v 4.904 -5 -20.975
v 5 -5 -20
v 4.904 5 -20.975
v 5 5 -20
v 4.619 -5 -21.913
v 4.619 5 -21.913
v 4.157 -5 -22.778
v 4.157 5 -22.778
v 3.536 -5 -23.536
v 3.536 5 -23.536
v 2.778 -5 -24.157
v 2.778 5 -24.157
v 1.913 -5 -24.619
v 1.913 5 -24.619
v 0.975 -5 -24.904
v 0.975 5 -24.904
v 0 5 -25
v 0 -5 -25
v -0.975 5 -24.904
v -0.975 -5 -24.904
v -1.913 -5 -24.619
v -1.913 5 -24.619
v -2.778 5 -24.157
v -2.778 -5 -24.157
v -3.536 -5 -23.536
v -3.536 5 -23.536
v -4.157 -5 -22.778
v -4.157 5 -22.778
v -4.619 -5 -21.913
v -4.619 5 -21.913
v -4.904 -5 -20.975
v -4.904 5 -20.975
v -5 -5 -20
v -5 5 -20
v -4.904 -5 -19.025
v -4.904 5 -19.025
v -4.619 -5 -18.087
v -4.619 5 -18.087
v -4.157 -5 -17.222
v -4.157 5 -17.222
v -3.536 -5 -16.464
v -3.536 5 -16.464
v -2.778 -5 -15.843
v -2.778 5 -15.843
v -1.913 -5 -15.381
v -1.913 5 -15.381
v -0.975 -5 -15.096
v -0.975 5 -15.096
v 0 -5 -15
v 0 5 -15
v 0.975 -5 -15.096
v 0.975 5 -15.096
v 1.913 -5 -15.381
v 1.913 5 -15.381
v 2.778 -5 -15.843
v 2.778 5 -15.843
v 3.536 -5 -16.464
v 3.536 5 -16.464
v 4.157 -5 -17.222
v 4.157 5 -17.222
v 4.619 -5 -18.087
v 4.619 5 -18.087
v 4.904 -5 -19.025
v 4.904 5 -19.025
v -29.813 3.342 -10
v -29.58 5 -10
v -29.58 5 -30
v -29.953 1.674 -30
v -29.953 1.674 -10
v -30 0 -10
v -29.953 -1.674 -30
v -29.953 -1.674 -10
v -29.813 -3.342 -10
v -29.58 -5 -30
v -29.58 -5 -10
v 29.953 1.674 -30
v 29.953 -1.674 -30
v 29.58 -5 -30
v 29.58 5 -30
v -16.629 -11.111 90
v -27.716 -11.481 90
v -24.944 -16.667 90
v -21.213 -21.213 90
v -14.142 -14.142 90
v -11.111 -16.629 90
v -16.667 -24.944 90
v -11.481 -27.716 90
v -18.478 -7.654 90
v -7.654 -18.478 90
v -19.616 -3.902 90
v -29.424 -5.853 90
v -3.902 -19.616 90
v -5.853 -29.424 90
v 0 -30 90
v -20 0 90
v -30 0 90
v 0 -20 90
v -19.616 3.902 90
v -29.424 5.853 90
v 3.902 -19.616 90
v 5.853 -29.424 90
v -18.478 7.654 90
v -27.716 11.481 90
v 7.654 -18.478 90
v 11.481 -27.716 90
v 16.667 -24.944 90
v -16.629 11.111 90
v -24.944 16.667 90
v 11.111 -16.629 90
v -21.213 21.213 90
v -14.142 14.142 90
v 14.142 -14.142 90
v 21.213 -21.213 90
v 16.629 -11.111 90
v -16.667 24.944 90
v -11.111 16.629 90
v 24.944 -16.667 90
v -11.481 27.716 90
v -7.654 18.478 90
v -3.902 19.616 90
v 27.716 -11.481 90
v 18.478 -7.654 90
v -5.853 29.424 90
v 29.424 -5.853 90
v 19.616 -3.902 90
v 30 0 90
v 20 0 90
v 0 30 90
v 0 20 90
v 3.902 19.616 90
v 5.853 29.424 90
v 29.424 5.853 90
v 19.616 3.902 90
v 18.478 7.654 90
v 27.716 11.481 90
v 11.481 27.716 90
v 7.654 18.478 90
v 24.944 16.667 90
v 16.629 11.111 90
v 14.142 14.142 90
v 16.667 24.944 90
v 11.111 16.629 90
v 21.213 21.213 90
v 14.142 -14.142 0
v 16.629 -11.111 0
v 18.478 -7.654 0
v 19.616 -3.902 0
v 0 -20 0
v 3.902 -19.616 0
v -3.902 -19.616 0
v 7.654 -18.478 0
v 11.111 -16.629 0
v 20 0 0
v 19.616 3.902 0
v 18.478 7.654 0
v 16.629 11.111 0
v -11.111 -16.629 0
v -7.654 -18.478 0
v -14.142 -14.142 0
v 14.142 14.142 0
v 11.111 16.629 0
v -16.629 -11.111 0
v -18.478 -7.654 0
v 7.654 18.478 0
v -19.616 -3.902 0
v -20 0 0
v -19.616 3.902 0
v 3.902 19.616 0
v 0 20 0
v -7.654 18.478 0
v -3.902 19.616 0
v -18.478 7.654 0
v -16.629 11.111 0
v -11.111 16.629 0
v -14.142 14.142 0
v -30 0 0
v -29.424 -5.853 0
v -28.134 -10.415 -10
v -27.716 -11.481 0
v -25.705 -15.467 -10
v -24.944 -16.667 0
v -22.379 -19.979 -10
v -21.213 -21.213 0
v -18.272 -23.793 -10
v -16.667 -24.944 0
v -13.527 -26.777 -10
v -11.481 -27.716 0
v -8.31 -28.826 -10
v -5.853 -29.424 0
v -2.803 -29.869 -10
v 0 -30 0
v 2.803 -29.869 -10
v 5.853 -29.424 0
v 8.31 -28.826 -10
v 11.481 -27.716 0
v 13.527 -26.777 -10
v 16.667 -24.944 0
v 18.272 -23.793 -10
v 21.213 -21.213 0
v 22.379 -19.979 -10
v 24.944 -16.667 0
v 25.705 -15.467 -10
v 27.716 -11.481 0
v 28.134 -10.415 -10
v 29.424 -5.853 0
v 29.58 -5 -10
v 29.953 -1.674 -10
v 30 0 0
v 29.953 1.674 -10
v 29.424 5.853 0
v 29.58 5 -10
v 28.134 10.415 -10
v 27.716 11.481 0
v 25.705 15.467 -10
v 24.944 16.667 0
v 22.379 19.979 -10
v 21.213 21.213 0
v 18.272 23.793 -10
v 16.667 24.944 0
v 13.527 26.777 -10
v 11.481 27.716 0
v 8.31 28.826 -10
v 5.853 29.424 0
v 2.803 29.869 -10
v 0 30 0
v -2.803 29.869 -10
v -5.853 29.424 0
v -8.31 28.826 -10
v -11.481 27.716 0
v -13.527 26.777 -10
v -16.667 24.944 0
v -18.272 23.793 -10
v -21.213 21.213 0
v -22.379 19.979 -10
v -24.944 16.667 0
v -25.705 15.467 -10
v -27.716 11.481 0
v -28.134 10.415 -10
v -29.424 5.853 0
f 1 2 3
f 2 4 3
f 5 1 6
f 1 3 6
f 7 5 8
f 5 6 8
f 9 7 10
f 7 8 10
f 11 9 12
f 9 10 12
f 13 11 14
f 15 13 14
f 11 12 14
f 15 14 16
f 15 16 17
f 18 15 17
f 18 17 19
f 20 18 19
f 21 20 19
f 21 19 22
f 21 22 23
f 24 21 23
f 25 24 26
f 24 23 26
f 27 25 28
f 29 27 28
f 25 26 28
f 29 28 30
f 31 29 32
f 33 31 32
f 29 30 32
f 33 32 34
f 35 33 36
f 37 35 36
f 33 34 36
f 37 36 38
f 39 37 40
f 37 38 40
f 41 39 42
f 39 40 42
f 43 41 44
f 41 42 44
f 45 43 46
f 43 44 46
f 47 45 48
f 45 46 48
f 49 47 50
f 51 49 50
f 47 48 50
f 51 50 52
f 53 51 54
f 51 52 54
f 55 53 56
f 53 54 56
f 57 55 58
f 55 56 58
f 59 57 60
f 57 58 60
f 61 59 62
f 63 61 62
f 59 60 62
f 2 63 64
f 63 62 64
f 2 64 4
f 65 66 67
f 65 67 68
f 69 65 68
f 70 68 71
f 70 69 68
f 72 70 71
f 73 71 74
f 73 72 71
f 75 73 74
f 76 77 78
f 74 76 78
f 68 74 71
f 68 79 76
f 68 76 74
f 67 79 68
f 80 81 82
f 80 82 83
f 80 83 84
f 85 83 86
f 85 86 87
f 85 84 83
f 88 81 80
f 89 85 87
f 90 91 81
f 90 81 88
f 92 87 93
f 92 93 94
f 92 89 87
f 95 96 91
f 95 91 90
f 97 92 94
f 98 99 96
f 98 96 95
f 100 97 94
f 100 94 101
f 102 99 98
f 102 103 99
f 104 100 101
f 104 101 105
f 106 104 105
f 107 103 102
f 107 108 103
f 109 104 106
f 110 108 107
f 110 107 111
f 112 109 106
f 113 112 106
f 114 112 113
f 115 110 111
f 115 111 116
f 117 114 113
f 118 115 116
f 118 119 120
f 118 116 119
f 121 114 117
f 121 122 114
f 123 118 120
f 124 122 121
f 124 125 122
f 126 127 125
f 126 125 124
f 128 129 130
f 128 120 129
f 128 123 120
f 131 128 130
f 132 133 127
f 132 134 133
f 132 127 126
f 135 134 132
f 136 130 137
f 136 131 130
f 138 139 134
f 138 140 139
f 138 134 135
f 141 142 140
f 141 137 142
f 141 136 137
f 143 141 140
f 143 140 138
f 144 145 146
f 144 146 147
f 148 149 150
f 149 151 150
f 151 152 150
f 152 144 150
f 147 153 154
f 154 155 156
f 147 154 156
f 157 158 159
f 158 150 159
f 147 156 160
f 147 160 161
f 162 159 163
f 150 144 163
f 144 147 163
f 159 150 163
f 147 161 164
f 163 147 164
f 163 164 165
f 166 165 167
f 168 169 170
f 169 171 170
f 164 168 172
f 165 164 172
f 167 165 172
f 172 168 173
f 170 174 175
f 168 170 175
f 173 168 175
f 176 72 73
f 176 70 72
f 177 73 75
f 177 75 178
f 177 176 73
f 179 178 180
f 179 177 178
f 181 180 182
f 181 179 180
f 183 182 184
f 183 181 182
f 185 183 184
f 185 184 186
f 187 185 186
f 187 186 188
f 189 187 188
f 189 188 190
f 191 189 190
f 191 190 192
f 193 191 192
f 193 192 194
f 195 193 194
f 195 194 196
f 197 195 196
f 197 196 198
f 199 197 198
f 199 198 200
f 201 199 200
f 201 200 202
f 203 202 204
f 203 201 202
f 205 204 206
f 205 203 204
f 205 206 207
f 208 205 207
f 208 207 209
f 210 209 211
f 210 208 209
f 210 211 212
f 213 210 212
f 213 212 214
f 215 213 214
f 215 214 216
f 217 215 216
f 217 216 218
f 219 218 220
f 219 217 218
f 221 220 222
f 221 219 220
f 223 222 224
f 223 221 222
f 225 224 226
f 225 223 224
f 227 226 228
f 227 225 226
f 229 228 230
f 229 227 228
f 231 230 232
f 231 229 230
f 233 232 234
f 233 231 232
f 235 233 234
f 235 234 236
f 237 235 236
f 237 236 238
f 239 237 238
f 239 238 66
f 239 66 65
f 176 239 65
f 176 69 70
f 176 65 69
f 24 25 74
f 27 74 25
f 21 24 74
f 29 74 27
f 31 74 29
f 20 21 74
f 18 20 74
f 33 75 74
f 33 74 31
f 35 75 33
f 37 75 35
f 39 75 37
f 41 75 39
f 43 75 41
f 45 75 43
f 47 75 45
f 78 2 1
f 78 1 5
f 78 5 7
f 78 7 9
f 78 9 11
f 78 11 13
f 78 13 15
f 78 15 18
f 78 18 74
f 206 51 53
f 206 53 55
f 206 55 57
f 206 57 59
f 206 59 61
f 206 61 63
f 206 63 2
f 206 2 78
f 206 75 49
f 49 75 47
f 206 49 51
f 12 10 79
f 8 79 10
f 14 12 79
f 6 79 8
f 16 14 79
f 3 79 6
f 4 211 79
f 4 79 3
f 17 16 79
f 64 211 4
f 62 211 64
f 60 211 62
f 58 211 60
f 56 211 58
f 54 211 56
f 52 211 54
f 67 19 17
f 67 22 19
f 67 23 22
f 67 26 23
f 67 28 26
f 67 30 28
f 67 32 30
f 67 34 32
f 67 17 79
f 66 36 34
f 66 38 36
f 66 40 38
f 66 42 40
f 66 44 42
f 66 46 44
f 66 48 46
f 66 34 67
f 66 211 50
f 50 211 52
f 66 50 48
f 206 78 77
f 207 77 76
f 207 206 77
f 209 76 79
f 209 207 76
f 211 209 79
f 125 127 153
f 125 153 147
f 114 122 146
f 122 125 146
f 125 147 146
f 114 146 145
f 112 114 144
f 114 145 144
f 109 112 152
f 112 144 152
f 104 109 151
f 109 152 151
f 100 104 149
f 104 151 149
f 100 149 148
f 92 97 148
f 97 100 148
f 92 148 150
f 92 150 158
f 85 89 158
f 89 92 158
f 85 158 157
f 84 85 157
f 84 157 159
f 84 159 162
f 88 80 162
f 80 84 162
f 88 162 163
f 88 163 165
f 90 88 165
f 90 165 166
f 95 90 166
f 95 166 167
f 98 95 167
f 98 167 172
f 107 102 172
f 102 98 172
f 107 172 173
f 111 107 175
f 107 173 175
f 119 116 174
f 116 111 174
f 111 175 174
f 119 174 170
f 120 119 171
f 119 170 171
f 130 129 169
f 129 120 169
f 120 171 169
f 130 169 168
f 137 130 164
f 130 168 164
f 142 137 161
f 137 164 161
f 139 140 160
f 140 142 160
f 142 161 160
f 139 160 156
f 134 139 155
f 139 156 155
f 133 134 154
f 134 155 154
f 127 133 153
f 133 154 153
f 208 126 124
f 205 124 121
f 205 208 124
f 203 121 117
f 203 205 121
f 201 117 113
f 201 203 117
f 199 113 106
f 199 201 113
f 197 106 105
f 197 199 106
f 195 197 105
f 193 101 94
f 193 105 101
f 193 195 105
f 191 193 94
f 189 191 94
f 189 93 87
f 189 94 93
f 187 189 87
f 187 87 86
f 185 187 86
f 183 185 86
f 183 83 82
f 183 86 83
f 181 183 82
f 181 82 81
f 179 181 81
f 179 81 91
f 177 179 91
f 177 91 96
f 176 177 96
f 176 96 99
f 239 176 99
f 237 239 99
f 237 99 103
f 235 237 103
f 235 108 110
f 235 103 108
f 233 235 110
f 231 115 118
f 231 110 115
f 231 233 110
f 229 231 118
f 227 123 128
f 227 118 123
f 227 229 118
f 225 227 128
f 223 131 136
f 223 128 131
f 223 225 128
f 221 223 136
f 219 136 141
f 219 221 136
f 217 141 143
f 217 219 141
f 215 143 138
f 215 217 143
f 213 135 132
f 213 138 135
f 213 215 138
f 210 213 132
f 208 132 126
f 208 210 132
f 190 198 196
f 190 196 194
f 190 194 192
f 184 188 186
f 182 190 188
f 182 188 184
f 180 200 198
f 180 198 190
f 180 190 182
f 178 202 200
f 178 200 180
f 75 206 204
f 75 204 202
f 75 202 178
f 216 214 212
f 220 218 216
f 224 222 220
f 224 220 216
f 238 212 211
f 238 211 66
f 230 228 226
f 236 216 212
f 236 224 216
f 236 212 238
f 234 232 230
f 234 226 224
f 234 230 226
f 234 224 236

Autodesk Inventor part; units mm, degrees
ref_plane "YZ Plane" through (0, 0, 0) normal (1, 0, 0) x (0, 1, 0)
ref_plane "XZ Plane" through (0, 0, 0) normal (0, 1, 0) x (-1, 0, 0)
ref_plane "XY Plane" through (0, 0, 0) normal (0, 0, 1) x (1, 0, 0)
sketch "Эскиз1" plane through (0, 0, 0) normal (0, 0, 1) x (1, 0, 0)
  circle A0 centre (0, 0) radius 20
  circle A1 centre (0, 0) radius 30
  dimension "d0" = 40
  dimension "d1" = 10
extrude "Выдавливание1" add sketch "Эскиз1" along normal blind 90
sketch "Эскиз2" plane through (0, 0, 0) normal (0, 0, -1) x (-1, 0, 0)
  circle A0 centre (0, 0) radius 30 projected
extrude "Выдавливание2" add sketch "Эскиз2" along normal blind 10
sketch "Эскиз3" plane through (0, 0, -10) normal (0, 0, -1) x (-1, 0, 0)
  circle A0 centre (0, 0) radius 30 projected
  line L0 (-29.5804, 5) -> (29.5804, 5)
  line L1 (29.5804, -5) -> (-29.5804, -5)
  line L2 (42, 0) -> (-42, 0) projected
  dimension "d7" = 10
extrude "Выдавливание3" add sketch "Эскиз3" along normal blind 20 contours L2 A0 L0 | A0 L1 L2
sketch "Эскиз4" plane through (-29.5804, 5, -10) normal (0, 1, 0) x (1, 0, 0)
  line L0 (59.1608, 0) -> (0, 0) projected
  line L1 (59.1608, 0) -> (59.1608, 20) projected
  line L2 (0, 20) -> (59.1608, 20) projected
  line L3 (0, 0) -> (0, 20) projected
  line L4 (59.1608, 0) -> (59.1608, 20) projected
  line L5 (0, 0) -> (59.1608, 0) projected
  line L6 (0, 0) -> (0, 20) projected
  line L7 (0, 20) -> (59.1608, 20) projected
  circle A0 centre (29.5804, 10) radius 5
  point P0 (29.5804, -10)
  dimension "d11" = 10
extrude "Выдавливание4" cut sketch "Эскиз4" along normal through all both and the other way through all contours A0
properties part number "стакан_v2" material "Сталь"
